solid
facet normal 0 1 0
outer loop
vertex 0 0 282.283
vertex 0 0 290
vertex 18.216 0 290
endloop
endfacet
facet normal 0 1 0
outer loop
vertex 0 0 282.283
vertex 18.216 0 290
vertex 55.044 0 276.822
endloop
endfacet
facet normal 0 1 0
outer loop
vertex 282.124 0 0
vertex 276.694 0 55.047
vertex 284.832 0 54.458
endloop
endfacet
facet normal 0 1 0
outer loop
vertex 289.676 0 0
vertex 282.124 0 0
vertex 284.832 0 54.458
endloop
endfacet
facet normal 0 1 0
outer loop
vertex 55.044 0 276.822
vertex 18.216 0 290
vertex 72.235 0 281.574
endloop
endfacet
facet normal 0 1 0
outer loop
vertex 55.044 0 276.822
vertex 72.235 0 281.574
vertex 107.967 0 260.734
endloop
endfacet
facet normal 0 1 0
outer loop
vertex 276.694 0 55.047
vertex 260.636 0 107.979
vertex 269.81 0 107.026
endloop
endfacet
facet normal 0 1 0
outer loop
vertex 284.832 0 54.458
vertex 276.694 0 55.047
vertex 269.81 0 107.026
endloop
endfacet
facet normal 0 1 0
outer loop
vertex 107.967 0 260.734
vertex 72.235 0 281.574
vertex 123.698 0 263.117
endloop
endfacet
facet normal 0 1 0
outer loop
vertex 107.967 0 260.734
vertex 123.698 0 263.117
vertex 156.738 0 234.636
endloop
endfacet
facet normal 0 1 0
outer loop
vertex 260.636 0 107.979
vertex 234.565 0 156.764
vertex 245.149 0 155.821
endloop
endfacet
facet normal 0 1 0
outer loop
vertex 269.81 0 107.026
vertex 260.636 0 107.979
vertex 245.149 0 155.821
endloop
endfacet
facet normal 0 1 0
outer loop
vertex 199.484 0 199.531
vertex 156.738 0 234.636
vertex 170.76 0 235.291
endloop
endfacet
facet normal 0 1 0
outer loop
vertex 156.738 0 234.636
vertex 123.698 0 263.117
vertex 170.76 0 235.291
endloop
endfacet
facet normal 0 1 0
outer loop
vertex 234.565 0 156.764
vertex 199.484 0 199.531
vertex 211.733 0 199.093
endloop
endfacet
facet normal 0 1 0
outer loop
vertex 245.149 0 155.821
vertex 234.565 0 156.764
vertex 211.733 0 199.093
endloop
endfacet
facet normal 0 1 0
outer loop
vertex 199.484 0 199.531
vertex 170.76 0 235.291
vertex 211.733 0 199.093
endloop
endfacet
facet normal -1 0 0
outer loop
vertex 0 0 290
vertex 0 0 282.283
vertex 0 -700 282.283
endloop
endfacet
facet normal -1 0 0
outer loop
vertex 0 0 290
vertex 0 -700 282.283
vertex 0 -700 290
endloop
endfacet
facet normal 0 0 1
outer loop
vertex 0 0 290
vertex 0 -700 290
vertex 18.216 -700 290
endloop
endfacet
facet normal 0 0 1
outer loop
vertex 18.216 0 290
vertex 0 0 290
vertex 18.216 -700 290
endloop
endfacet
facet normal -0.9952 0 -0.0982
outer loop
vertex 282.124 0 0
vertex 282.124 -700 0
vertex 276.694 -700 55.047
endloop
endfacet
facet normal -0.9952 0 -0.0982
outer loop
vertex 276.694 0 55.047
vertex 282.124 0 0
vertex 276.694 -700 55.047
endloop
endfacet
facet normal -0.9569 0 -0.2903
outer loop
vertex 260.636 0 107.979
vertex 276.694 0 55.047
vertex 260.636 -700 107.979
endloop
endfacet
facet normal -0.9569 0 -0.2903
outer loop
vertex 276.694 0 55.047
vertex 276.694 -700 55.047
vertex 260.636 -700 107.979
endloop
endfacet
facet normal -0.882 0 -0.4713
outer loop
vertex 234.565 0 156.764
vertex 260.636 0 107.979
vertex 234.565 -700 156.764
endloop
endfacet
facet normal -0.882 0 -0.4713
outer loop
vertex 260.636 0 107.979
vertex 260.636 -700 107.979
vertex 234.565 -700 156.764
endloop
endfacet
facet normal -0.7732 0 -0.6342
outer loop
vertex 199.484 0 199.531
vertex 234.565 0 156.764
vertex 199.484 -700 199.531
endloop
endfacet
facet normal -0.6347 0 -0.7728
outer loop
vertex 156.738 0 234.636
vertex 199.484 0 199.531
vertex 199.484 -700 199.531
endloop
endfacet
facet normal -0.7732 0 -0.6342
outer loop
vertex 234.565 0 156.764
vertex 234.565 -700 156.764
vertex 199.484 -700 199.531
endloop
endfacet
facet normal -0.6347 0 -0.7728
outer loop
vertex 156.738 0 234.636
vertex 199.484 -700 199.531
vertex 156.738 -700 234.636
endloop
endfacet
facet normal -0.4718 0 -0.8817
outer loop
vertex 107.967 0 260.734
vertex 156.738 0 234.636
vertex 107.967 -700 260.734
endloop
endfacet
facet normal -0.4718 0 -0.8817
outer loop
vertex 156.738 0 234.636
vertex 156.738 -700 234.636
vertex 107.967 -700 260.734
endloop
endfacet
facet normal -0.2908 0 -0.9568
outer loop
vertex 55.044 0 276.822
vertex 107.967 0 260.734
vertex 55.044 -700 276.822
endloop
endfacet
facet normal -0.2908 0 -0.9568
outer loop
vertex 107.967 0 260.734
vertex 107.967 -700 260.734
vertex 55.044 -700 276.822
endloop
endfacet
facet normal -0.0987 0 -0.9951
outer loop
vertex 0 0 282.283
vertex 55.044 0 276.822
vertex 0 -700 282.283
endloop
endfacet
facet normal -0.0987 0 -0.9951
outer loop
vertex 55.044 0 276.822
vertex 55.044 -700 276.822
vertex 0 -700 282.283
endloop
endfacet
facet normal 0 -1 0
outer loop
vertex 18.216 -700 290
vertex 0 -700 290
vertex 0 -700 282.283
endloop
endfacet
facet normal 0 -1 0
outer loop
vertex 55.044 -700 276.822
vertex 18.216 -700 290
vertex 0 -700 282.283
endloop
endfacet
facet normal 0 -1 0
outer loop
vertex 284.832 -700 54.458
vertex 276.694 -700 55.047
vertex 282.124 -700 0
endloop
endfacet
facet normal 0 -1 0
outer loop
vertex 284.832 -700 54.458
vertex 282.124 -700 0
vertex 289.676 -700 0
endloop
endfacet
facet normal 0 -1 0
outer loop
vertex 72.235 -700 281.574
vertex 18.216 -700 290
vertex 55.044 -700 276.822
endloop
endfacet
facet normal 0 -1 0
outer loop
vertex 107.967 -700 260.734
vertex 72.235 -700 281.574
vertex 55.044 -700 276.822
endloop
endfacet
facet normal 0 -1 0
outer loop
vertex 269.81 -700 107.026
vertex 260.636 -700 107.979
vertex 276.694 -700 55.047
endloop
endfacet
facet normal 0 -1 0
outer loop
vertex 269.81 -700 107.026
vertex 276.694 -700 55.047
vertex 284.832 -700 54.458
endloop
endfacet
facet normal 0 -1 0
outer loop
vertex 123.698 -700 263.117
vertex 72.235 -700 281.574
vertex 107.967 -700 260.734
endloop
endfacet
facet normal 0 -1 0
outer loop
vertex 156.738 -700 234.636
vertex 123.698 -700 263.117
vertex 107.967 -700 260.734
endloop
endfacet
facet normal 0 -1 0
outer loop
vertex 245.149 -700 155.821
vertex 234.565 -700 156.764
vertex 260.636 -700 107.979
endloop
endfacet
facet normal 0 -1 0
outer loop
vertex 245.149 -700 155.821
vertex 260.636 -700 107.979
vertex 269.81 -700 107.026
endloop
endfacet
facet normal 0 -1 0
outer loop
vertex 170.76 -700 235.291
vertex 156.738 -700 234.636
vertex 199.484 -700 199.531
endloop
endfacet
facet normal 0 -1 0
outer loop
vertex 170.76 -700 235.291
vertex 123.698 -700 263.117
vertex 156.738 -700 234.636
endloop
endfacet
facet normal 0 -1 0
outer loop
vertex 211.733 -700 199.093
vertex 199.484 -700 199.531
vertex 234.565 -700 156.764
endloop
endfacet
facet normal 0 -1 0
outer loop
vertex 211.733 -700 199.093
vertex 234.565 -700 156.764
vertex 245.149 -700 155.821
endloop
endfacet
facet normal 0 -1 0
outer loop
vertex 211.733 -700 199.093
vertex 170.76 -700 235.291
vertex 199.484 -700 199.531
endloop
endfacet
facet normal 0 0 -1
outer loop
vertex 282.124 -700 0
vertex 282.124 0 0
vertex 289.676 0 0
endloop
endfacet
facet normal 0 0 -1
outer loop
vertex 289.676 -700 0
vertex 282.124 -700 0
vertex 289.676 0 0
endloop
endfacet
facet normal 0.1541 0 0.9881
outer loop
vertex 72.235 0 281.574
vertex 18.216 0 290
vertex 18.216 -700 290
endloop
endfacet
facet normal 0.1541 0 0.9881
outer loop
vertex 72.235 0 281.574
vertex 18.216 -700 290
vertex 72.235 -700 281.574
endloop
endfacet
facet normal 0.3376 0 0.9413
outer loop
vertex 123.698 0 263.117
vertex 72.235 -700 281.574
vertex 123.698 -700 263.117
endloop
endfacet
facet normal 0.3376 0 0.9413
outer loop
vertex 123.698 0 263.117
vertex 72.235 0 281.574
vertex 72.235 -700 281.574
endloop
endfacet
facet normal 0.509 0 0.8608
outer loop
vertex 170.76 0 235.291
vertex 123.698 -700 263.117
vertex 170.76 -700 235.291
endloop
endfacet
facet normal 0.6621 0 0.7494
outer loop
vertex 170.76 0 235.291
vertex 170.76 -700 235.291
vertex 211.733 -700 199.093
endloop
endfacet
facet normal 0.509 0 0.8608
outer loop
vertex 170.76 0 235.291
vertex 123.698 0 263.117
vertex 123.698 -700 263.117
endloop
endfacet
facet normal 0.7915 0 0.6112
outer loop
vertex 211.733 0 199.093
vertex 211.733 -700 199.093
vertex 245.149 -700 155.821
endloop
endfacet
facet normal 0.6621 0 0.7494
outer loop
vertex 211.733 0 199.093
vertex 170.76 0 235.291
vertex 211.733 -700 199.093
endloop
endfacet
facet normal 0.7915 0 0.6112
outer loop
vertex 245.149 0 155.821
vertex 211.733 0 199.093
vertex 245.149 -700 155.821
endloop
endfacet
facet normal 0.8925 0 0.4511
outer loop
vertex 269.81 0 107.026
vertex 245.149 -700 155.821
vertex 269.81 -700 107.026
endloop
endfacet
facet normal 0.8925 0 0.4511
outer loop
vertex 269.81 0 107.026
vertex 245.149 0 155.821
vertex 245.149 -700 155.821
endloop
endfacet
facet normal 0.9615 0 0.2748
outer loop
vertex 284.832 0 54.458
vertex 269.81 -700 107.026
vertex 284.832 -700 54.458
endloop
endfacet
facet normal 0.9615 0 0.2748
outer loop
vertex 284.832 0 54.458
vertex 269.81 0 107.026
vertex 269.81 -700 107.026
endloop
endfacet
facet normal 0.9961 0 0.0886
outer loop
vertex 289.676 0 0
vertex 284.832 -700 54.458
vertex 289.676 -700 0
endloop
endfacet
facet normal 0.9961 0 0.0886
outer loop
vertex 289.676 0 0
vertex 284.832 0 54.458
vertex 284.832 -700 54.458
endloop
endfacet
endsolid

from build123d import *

# Parameters (mm, degrees)
F0_W     = 290
F0_H     = 290
F1_DEPTH = 700
F3_DEPTH = 795
F5_DEPTH = 770


with BuildPart() as f1:
    # F0 (on Front) → F1 (new body)
    with BuildSketch(Plane.XZ):
        with Locations((145, 145)):
            Rectangle(F0_W, F0_H)
    extrude(amount=F1_DEPTH)

    # F2 (on face) → F3 (cut)
    with BuildSketch(Plane.XZ):
        with BuildLine():
            ThreePointArc((18.21568, 290), (211.733128, 199.092972), (289.675921, 0))
            Line((289.675921, 0), (290, 0))
            Line((290, 0), (290, 290))
            Line((290, 290), (18.21568, 290))
        make_face()
    extrude(amount=F3_DEPTH, mode=Mode.SUBTRACT)

    # F4 (on face) → F5 (cut)
    with BuildSketch(Plane.XZ.offset(700)):
        with BuildLine():
            Line((0, 0), (282.123595, 0))
            ThreePointArc((282.123595, 0), (199.483979, 199.530675), (0, 282.282948))
            Line((0, 282.282948), (0, 0))
        make_face()
    extrude(amount=-F5_DEPTH, mode=Mode.SUBTRACT)


solid = f1.part
